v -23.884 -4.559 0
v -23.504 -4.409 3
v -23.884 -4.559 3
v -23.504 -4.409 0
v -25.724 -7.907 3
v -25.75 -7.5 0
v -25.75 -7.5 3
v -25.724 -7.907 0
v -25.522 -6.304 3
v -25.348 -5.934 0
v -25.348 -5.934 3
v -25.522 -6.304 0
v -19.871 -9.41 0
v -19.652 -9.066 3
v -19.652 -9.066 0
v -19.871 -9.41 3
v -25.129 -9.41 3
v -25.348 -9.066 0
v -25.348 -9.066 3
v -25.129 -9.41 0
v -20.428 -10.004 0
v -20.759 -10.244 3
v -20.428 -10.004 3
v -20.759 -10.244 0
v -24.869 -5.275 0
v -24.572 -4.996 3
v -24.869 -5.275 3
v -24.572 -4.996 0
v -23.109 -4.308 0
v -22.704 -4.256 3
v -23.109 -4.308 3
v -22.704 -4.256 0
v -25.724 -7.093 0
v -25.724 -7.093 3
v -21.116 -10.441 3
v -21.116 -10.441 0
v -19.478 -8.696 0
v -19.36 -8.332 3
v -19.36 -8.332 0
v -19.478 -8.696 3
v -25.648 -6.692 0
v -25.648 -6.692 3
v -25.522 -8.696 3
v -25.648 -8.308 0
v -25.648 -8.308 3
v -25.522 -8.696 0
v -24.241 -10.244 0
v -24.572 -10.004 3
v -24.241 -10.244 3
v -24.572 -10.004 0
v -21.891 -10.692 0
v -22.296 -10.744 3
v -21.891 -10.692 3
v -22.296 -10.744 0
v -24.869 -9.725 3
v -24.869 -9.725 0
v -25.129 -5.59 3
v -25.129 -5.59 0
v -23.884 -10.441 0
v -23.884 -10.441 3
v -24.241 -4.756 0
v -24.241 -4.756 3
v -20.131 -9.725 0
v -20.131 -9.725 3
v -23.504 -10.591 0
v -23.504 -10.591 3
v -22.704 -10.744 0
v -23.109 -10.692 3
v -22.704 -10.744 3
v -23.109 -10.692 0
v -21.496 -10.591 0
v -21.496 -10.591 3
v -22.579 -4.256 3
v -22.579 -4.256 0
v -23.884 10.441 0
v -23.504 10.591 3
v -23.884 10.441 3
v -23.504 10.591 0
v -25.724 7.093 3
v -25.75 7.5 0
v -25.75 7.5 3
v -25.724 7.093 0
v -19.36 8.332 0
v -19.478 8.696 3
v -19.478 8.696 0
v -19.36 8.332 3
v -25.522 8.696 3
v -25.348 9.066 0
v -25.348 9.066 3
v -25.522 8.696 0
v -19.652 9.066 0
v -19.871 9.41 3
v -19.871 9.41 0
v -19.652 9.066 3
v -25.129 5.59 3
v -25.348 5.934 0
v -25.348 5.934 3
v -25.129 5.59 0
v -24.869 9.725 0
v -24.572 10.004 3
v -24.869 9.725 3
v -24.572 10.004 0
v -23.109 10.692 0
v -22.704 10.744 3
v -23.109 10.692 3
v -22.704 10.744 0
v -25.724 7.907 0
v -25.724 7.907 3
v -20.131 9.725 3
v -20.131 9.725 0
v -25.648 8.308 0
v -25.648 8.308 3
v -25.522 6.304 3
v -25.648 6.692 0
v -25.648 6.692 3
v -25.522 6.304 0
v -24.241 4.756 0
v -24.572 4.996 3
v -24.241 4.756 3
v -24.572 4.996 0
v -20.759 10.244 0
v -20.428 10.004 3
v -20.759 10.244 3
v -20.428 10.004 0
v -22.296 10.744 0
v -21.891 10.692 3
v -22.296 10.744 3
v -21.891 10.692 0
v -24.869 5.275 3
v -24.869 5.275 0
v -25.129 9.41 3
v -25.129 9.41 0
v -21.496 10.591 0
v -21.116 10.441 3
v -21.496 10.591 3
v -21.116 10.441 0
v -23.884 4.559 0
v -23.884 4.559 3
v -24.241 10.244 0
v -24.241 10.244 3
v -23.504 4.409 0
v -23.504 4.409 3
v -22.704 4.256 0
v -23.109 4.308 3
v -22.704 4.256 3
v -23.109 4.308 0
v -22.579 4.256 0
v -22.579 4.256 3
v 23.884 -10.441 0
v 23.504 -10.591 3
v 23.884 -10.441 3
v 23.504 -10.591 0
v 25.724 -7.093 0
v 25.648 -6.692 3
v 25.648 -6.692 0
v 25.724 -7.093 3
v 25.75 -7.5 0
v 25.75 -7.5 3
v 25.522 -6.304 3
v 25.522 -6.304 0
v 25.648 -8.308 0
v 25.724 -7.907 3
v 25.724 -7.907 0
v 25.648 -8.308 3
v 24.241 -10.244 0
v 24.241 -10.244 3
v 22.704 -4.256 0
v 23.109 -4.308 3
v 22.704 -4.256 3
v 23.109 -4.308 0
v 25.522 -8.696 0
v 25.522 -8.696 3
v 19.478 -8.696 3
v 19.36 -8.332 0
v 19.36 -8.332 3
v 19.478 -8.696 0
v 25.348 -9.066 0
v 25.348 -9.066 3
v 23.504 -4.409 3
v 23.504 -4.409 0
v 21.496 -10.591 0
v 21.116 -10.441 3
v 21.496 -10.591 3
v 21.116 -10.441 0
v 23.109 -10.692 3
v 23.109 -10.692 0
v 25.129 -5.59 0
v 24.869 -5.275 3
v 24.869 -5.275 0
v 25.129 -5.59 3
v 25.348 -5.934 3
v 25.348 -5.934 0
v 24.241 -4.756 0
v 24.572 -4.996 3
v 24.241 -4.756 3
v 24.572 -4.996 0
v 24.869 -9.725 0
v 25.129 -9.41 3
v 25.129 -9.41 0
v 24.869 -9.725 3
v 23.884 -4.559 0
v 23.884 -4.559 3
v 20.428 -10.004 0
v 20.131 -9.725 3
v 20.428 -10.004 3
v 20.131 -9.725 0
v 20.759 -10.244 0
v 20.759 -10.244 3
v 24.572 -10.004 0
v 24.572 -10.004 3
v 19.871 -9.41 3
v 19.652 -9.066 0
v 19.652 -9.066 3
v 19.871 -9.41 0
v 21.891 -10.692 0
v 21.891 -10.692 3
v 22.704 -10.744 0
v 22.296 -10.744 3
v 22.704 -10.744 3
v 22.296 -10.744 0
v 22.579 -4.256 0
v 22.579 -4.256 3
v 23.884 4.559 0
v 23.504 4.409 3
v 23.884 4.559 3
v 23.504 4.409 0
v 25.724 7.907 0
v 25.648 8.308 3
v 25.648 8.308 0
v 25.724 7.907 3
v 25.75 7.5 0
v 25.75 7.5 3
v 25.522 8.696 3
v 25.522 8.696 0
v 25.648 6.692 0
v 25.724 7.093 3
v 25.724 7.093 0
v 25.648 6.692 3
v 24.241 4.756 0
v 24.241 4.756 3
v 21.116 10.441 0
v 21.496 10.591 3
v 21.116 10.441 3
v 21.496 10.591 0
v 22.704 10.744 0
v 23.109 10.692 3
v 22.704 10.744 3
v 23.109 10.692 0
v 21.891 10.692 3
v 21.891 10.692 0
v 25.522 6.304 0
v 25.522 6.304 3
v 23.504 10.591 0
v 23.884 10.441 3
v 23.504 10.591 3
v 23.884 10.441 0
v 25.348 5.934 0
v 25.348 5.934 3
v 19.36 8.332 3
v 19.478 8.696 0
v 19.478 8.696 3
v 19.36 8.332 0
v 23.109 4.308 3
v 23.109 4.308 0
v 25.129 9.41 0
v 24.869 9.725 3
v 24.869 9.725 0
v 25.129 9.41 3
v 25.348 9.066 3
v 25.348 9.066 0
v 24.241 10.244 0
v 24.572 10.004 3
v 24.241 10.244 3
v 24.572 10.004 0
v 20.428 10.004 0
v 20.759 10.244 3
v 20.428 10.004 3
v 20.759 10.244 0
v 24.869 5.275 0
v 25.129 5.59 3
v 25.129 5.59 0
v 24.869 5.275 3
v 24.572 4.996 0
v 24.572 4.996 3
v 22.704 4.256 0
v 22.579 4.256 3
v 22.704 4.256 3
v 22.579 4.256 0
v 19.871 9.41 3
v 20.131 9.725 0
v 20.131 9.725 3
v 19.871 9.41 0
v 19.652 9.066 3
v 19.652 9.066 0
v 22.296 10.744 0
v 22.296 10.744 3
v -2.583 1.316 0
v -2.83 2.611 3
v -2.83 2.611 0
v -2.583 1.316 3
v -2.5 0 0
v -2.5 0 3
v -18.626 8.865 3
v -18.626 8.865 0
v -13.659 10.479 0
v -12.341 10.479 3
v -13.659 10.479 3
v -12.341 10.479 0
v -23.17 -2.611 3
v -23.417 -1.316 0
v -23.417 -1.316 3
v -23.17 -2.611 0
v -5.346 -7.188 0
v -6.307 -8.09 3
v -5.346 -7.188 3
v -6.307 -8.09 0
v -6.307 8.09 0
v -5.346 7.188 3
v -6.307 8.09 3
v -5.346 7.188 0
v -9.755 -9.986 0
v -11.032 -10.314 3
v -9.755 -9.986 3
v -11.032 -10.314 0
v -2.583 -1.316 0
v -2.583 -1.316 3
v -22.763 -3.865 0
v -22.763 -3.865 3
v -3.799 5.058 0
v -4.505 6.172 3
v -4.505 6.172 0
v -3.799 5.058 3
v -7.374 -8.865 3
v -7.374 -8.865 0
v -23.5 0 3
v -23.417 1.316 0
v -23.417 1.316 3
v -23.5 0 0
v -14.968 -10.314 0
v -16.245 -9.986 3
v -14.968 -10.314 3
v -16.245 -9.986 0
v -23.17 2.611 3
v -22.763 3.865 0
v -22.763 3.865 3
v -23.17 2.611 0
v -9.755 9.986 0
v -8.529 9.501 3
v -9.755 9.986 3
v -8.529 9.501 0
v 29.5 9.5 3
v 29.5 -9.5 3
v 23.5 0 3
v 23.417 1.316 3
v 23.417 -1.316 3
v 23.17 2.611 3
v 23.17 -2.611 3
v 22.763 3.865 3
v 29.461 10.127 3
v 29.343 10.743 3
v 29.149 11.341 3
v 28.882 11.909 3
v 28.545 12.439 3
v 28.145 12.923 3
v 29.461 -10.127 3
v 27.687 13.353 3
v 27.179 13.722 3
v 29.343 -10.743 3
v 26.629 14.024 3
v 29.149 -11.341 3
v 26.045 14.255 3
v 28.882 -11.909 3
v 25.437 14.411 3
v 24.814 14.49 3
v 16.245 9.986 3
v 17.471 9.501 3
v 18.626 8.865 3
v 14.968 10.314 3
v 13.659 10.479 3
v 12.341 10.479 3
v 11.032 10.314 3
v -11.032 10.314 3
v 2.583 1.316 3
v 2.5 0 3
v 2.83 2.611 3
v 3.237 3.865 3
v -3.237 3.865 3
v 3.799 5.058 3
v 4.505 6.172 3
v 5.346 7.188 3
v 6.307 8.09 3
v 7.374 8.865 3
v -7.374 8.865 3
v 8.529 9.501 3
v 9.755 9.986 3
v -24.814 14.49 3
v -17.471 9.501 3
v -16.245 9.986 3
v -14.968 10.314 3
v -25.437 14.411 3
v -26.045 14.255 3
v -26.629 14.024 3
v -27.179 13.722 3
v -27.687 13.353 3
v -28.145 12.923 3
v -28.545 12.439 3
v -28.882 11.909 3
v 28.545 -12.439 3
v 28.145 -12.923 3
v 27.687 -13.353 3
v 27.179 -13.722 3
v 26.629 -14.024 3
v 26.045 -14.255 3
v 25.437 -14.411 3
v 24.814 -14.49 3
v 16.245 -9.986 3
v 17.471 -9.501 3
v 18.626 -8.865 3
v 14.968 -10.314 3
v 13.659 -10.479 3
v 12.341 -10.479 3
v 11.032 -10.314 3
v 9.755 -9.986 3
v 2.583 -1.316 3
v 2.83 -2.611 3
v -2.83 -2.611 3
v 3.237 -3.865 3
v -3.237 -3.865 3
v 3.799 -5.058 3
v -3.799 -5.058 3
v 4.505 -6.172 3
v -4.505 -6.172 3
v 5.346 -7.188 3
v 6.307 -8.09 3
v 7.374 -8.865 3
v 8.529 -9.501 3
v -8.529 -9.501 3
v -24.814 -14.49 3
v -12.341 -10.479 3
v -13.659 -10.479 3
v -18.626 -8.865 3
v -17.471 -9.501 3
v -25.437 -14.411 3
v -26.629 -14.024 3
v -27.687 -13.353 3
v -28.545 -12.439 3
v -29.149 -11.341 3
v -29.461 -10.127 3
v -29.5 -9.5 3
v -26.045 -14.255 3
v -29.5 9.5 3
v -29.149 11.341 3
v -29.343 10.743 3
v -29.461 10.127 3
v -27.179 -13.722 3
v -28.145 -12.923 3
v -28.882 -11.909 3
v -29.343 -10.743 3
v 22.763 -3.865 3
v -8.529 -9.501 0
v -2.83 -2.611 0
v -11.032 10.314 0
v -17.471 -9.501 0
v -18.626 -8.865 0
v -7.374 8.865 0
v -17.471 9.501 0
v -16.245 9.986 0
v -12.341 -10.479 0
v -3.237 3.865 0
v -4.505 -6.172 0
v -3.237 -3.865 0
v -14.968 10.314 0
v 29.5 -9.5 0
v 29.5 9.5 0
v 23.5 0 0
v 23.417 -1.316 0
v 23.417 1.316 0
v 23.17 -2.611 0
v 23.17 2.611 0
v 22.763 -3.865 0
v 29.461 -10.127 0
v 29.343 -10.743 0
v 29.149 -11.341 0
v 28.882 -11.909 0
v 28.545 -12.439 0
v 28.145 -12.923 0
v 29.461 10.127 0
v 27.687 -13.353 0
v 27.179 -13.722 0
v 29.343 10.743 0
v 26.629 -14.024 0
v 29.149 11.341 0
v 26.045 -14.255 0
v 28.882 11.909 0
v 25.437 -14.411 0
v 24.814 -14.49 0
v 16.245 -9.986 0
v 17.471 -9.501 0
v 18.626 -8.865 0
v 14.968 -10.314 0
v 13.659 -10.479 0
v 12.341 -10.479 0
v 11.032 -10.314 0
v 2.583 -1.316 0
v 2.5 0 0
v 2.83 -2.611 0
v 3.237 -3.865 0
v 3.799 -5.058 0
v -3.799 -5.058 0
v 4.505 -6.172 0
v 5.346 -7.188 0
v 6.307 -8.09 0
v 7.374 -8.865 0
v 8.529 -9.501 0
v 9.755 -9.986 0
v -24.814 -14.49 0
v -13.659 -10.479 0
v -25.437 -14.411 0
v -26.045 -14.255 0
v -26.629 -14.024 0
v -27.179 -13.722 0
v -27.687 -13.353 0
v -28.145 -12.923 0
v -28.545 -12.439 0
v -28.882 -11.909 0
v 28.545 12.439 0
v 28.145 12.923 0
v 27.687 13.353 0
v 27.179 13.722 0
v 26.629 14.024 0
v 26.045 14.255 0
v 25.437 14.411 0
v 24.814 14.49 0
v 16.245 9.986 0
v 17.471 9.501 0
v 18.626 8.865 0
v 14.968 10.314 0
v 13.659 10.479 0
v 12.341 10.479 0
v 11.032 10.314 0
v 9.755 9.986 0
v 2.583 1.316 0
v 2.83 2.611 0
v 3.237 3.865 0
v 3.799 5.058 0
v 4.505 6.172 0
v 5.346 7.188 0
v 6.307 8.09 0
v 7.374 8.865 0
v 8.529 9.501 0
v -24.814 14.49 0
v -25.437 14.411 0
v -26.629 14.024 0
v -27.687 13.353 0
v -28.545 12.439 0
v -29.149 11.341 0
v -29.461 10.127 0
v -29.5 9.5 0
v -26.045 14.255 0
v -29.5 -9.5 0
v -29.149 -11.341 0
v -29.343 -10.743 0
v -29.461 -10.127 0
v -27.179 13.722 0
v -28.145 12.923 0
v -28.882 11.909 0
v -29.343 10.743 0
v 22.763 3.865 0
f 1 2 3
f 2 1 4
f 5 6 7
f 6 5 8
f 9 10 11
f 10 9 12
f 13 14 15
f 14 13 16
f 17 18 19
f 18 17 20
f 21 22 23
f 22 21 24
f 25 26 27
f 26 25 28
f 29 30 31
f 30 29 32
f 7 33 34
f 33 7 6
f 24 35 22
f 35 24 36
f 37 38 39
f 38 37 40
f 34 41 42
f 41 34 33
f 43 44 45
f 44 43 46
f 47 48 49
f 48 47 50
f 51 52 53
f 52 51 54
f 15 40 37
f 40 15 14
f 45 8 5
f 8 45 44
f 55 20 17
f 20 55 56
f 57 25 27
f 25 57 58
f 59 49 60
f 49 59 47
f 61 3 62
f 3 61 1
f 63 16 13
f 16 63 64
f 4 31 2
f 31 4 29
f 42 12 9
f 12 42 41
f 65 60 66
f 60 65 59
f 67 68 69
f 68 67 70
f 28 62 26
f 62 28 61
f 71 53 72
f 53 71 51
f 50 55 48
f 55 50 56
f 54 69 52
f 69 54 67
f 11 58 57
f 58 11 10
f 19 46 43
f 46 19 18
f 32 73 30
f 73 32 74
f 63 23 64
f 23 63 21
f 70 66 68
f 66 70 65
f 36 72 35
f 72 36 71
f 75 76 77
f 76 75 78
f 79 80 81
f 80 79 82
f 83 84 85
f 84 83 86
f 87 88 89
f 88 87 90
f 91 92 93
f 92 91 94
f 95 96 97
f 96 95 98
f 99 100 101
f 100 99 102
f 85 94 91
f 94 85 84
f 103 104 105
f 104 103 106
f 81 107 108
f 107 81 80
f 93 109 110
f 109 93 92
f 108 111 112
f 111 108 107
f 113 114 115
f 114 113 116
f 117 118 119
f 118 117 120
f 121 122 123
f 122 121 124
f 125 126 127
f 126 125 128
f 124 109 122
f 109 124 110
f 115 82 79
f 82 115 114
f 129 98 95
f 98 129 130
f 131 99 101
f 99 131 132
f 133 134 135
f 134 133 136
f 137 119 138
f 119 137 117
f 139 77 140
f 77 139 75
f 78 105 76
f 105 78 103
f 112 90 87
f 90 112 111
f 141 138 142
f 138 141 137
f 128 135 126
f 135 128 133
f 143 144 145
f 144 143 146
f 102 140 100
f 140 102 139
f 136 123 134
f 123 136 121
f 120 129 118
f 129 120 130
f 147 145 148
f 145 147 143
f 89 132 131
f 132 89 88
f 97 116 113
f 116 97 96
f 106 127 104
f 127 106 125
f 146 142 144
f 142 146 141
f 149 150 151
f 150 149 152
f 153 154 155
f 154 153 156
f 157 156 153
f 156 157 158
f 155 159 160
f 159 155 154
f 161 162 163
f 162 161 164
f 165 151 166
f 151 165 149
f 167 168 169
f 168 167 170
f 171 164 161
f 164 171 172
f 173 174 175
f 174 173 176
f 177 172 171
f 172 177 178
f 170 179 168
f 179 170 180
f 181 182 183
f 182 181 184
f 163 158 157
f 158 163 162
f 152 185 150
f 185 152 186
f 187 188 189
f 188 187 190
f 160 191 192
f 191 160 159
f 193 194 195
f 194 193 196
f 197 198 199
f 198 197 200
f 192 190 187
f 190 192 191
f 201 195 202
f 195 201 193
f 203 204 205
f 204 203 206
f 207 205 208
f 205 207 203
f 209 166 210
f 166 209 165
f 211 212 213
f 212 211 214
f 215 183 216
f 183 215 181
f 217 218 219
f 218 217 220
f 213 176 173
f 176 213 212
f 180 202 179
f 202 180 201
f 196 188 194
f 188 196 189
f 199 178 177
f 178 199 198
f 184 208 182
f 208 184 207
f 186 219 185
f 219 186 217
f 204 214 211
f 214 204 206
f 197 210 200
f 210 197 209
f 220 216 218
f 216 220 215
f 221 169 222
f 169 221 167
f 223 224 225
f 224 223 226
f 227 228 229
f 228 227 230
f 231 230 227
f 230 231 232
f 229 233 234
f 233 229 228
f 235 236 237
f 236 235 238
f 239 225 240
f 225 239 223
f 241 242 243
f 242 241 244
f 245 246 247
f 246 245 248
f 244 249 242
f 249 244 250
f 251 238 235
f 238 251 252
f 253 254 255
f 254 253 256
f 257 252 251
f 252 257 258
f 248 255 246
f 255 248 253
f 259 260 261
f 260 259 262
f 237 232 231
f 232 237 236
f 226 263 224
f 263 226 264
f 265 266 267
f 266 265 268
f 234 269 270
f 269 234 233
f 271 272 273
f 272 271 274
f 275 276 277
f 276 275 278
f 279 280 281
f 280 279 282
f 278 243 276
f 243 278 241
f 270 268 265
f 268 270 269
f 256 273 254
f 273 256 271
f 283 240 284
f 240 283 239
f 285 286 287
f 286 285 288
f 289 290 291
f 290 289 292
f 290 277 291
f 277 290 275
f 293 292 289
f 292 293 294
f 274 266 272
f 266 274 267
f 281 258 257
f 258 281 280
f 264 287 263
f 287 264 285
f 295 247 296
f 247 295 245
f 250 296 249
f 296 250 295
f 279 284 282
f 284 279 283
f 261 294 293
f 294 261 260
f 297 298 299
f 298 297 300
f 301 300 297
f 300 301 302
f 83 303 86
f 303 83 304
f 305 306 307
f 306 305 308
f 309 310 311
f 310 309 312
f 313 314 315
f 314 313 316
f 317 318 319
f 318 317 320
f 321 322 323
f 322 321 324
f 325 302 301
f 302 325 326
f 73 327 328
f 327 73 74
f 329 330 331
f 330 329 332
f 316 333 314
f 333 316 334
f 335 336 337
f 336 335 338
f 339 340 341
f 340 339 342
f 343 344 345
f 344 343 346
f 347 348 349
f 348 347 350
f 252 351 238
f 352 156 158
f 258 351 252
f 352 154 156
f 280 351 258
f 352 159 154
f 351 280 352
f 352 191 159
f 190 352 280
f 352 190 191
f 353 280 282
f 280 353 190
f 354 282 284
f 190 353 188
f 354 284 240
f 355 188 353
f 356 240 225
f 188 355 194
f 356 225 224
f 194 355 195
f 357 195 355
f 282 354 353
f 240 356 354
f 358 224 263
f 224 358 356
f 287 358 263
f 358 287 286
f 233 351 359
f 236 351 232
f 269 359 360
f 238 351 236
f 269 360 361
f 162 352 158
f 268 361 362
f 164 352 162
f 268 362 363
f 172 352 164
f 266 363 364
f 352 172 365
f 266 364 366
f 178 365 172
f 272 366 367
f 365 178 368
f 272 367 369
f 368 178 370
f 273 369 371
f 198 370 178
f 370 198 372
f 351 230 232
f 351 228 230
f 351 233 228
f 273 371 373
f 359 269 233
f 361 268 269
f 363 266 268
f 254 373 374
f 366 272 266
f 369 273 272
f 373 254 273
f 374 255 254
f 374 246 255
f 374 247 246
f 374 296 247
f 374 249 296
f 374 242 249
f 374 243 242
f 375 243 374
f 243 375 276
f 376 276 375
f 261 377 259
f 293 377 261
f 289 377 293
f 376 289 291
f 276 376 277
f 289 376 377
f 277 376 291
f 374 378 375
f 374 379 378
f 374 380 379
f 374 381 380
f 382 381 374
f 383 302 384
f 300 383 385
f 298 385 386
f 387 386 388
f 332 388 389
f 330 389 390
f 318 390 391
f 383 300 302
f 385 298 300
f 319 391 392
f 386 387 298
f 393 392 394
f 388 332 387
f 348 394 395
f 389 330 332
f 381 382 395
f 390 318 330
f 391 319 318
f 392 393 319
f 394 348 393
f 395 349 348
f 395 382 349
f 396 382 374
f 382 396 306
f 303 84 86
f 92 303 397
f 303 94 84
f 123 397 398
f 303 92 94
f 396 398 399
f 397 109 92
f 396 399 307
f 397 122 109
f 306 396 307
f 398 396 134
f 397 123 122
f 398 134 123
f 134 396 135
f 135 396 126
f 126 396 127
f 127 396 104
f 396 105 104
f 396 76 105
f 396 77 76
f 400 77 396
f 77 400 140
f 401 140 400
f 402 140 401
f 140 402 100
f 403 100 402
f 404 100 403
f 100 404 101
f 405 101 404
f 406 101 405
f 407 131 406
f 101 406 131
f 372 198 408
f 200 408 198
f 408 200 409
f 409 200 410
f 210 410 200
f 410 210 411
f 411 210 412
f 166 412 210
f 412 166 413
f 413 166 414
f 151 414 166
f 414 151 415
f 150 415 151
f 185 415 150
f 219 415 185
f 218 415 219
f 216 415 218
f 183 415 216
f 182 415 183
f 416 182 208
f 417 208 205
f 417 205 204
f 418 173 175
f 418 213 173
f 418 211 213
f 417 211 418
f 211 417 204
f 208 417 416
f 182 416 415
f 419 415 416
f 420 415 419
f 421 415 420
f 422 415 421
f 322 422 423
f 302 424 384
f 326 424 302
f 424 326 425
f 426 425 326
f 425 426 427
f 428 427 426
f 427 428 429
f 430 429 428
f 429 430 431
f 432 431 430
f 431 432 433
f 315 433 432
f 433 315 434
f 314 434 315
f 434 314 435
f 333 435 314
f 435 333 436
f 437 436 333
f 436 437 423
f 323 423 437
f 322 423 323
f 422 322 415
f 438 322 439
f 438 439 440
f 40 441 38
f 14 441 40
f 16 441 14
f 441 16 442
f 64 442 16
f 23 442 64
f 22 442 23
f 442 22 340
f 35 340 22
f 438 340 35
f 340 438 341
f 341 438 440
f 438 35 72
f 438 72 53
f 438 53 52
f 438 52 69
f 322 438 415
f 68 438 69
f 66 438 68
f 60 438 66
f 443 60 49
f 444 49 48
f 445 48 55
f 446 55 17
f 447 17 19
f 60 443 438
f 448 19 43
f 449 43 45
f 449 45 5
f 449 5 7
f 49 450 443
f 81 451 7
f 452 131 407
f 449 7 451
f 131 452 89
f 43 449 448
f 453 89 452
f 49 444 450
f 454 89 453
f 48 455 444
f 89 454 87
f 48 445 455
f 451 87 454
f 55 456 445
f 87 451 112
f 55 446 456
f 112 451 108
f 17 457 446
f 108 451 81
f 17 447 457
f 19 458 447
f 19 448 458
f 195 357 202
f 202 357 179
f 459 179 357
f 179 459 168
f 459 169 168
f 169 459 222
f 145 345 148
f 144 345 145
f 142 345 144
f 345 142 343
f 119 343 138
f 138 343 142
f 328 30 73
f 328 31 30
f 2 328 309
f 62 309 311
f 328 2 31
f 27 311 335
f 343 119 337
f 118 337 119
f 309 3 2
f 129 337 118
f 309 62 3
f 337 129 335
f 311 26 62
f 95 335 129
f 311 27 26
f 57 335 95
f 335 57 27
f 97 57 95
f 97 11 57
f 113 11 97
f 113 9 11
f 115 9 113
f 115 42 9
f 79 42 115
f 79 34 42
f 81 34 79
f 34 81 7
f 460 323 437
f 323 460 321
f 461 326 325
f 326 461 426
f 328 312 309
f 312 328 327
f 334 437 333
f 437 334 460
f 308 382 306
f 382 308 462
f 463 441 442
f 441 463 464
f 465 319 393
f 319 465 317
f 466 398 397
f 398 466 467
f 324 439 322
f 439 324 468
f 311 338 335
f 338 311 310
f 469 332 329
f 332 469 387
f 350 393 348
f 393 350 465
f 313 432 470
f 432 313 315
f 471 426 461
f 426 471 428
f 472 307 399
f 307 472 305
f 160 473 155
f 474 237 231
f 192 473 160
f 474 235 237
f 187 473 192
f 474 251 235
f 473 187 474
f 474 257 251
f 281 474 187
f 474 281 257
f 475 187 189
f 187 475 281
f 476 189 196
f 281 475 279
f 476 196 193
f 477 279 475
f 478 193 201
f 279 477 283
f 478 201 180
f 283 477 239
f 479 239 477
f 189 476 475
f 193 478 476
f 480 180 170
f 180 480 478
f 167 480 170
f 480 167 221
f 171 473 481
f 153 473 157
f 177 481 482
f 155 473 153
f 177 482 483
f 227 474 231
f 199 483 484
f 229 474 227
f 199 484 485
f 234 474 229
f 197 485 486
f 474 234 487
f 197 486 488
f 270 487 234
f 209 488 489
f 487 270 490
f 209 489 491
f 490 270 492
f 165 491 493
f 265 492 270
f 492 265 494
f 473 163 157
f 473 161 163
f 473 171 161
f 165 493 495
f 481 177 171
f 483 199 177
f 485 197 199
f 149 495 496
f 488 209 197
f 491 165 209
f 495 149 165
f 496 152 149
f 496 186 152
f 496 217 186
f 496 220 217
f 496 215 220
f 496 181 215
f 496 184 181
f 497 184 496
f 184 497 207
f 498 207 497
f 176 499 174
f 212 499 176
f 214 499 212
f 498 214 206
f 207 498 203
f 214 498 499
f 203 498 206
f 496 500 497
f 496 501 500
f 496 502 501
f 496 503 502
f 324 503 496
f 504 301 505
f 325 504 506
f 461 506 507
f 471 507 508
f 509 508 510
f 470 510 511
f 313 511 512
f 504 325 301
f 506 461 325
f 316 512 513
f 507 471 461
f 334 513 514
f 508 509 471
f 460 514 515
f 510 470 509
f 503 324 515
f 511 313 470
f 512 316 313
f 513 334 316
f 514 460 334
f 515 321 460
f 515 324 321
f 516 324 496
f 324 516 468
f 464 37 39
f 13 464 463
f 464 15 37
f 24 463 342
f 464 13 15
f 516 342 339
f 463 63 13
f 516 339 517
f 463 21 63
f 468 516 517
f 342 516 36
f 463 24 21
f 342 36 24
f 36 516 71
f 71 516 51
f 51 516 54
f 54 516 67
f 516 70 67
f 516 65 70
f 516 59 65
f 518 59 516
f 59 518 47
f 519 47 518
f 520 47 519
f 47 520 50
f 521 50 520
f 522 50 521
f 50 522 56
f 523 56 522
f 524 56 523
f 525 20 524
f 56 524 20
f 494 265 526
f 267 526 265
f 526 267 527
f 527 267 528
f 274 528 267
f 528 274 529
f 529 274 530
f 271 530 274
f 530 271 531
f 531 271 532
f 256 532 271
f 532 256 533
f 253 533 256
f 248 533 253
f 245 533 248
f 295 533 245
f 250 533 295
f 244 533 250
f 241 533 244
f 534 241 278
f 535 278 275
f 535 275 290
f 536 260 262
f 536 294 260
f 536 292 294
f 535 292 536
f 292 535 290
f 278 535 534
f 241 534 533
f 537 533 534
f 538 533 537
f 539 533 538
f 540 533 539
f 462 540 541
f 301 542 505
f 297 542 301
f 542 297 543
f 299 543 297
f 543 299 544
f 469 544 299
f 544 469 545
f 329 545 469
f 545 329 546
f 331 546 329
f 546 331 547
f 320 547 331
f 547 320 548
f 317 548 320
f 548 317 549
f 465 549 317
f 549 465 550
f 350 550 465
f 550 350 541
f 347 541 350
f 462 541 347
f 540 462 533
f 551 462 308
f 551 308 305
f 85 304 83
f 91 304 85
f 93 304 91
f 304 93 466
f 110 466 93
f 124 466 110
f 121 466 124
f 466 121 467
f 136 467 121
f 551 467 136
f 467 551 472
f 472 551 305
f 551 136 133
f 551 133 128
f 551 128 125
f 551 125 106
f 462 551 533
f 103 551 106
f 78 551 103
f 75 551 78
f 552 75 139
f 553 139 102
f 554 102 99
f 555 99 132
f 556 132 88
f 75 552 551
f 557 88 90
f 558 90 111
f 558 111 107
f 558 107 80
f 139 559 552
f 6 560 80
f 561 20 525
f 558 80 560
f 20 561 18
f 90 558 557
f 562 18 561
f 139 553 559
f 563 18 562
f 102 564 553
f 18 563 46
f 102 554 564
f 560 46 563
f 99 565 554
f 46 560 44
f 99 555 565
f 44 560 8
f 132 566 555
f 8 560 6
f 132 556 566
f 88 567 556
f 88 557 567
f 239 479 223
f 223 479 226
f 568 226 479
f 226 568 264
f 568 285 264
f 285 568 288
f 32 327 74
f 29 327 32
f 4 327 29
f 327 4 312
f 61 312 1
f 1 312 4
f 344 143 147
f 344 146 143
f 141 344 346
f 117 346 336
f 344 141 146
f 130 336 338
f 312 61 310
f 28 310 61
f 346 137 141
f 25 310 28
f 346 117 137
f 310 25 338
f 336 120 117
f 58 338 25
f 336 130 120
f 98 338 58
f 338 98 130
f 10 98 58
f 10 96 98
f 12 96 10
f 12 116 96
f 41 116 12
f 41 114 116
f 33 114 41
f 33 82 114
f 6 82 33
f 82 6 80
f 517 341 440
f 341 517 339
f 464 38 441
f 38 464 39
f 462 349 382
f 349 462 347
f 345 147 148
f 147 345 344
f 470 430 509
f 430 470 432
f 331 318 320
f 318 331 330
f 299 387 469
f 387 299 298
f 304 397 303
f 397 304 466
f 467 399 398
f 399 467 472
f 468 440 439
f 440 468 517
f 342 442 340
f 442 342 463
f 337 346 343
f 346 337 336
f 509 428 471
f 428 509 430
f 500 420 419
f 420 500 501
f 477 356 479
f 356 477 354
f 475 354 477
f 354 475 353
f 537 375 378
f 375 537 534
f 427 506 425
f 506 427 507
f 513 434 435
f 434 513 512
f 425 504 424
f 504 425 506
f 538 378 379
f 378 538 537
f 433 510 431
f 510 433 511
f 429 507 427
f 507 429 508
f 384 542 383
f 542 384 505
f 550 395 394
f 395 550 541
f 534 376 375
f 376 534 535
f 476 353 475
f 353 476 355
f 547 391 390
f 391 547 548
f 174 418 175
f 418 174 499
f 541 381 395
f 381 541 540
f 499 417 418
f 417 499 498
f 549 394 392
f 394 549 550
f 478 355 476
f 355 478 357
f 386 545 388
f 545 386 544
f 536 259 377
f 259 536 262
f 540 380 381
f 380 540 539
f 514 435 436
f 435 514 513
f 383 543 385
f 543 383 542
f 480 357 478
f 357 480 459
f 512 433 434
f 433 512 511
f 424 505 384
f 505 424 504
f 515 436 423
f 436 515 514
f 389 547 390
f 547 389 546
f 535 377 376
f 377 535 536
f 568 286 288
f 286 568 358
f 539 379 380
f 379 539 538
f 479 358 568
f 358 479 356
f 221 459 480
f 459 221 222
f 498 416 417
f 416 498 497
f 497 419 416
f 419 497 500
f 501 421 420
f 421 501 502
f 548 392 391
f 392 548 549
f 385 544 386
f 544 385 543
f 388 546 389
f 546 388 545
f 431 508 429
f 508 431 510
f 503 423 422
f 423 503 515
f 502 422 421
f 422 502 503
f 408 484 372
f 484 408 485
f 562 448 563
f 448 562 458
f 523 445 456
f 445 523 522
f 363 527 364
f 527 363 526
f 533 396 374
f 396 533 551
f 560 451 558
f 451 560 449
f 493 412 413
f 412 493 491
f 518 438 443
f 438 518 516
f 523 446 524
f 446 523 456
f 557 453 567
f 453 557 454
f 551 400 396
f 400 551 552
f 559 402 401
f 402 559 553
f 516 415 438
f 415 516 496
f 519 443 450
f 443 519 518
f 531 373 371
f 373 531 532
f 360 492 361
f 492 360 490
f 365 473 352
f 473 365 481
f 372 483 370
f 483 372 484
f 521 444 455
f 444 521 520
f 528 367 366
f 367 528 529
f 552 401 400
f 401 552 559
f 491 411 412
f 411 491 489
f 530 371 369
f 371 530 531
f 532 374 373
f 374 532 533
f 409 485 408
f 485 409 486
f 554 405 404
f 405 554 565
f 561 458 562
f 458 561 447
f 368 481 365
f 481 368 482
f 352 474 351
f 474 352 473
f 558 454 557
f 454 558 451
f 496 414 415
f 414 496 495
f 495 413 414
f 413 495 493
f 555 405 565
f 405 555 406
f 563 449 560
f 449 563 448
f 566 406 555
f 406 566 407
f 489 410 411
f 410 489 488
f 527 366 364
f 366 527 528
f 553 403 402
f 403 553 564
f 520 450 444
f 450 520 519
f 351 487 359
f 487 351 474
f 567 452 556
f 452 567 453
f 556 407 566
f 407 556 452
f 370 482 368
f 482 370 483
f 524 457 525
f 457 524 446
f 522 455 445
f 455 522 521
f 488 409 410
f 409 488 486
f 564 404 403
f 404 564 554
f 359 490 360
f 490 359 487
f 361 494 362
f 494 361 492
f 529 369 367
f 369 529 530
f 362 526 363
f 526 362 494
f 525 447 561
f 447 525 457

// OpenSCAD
$fn = 50;

difference() {
	union() {
		hull() {
			translate(v = [-24.5, 9.5, 0]) {
				cylinder(h = 3, r = 5);
			}
			translate(v = [24.5, 9.5, 0]) {
				cylinder(h = 3, r = 5);
			}
			translate(v = [-24.5, -9.5, 0]) {
				cylinder(h = 3, r = 5);
			}
			translate(v = [24.5, -9.5, 0]) {
				cylinder(h = 3, r = 5);
			}
		}
	}
	union() {
		translate(v = [-22.5, -7.5, -100.0]) {
			cylinder(h = 200, r = 3.25);
		}
		translate(v = [-22.5, 7.5, -100.0]) {
			cylinder(h = 200, r = 3.25);
		}
		translate(v = [22.5, -7.5, -100.0]) {
			cylinder(h = 200, r = 3.25);
		}
		translate(v = [22.5, 7.5, -100.0]) {
			cylinder(h = 200, r = 3.25);
		}
		translate(v = [-22.5, -7.5, -100.0]) {
			cylinder(h = 200, r = 1.8);
		}
		translate(v = [-22.5, 7.5, -100.0]) {
			cylinder(h = 200, r = 1.8);
		}
		translate(v = [22.5, -7.5, -100.0]) {
			cylinder(h = 200, r = 1.8);
		}
		translate(v = [22.5, 7.5, -100.0]) {
			cylinder(h = 200, r = 1.8);
		}
		translate(v = [-13.0, 0, 0.0]) {
			cylinder(h = 3, r = 10.5);
		}
		translate(v = [13.0, 0, 0.0]) {
			cylinder(h = 3, r = 10.5);
		}
	}
}
